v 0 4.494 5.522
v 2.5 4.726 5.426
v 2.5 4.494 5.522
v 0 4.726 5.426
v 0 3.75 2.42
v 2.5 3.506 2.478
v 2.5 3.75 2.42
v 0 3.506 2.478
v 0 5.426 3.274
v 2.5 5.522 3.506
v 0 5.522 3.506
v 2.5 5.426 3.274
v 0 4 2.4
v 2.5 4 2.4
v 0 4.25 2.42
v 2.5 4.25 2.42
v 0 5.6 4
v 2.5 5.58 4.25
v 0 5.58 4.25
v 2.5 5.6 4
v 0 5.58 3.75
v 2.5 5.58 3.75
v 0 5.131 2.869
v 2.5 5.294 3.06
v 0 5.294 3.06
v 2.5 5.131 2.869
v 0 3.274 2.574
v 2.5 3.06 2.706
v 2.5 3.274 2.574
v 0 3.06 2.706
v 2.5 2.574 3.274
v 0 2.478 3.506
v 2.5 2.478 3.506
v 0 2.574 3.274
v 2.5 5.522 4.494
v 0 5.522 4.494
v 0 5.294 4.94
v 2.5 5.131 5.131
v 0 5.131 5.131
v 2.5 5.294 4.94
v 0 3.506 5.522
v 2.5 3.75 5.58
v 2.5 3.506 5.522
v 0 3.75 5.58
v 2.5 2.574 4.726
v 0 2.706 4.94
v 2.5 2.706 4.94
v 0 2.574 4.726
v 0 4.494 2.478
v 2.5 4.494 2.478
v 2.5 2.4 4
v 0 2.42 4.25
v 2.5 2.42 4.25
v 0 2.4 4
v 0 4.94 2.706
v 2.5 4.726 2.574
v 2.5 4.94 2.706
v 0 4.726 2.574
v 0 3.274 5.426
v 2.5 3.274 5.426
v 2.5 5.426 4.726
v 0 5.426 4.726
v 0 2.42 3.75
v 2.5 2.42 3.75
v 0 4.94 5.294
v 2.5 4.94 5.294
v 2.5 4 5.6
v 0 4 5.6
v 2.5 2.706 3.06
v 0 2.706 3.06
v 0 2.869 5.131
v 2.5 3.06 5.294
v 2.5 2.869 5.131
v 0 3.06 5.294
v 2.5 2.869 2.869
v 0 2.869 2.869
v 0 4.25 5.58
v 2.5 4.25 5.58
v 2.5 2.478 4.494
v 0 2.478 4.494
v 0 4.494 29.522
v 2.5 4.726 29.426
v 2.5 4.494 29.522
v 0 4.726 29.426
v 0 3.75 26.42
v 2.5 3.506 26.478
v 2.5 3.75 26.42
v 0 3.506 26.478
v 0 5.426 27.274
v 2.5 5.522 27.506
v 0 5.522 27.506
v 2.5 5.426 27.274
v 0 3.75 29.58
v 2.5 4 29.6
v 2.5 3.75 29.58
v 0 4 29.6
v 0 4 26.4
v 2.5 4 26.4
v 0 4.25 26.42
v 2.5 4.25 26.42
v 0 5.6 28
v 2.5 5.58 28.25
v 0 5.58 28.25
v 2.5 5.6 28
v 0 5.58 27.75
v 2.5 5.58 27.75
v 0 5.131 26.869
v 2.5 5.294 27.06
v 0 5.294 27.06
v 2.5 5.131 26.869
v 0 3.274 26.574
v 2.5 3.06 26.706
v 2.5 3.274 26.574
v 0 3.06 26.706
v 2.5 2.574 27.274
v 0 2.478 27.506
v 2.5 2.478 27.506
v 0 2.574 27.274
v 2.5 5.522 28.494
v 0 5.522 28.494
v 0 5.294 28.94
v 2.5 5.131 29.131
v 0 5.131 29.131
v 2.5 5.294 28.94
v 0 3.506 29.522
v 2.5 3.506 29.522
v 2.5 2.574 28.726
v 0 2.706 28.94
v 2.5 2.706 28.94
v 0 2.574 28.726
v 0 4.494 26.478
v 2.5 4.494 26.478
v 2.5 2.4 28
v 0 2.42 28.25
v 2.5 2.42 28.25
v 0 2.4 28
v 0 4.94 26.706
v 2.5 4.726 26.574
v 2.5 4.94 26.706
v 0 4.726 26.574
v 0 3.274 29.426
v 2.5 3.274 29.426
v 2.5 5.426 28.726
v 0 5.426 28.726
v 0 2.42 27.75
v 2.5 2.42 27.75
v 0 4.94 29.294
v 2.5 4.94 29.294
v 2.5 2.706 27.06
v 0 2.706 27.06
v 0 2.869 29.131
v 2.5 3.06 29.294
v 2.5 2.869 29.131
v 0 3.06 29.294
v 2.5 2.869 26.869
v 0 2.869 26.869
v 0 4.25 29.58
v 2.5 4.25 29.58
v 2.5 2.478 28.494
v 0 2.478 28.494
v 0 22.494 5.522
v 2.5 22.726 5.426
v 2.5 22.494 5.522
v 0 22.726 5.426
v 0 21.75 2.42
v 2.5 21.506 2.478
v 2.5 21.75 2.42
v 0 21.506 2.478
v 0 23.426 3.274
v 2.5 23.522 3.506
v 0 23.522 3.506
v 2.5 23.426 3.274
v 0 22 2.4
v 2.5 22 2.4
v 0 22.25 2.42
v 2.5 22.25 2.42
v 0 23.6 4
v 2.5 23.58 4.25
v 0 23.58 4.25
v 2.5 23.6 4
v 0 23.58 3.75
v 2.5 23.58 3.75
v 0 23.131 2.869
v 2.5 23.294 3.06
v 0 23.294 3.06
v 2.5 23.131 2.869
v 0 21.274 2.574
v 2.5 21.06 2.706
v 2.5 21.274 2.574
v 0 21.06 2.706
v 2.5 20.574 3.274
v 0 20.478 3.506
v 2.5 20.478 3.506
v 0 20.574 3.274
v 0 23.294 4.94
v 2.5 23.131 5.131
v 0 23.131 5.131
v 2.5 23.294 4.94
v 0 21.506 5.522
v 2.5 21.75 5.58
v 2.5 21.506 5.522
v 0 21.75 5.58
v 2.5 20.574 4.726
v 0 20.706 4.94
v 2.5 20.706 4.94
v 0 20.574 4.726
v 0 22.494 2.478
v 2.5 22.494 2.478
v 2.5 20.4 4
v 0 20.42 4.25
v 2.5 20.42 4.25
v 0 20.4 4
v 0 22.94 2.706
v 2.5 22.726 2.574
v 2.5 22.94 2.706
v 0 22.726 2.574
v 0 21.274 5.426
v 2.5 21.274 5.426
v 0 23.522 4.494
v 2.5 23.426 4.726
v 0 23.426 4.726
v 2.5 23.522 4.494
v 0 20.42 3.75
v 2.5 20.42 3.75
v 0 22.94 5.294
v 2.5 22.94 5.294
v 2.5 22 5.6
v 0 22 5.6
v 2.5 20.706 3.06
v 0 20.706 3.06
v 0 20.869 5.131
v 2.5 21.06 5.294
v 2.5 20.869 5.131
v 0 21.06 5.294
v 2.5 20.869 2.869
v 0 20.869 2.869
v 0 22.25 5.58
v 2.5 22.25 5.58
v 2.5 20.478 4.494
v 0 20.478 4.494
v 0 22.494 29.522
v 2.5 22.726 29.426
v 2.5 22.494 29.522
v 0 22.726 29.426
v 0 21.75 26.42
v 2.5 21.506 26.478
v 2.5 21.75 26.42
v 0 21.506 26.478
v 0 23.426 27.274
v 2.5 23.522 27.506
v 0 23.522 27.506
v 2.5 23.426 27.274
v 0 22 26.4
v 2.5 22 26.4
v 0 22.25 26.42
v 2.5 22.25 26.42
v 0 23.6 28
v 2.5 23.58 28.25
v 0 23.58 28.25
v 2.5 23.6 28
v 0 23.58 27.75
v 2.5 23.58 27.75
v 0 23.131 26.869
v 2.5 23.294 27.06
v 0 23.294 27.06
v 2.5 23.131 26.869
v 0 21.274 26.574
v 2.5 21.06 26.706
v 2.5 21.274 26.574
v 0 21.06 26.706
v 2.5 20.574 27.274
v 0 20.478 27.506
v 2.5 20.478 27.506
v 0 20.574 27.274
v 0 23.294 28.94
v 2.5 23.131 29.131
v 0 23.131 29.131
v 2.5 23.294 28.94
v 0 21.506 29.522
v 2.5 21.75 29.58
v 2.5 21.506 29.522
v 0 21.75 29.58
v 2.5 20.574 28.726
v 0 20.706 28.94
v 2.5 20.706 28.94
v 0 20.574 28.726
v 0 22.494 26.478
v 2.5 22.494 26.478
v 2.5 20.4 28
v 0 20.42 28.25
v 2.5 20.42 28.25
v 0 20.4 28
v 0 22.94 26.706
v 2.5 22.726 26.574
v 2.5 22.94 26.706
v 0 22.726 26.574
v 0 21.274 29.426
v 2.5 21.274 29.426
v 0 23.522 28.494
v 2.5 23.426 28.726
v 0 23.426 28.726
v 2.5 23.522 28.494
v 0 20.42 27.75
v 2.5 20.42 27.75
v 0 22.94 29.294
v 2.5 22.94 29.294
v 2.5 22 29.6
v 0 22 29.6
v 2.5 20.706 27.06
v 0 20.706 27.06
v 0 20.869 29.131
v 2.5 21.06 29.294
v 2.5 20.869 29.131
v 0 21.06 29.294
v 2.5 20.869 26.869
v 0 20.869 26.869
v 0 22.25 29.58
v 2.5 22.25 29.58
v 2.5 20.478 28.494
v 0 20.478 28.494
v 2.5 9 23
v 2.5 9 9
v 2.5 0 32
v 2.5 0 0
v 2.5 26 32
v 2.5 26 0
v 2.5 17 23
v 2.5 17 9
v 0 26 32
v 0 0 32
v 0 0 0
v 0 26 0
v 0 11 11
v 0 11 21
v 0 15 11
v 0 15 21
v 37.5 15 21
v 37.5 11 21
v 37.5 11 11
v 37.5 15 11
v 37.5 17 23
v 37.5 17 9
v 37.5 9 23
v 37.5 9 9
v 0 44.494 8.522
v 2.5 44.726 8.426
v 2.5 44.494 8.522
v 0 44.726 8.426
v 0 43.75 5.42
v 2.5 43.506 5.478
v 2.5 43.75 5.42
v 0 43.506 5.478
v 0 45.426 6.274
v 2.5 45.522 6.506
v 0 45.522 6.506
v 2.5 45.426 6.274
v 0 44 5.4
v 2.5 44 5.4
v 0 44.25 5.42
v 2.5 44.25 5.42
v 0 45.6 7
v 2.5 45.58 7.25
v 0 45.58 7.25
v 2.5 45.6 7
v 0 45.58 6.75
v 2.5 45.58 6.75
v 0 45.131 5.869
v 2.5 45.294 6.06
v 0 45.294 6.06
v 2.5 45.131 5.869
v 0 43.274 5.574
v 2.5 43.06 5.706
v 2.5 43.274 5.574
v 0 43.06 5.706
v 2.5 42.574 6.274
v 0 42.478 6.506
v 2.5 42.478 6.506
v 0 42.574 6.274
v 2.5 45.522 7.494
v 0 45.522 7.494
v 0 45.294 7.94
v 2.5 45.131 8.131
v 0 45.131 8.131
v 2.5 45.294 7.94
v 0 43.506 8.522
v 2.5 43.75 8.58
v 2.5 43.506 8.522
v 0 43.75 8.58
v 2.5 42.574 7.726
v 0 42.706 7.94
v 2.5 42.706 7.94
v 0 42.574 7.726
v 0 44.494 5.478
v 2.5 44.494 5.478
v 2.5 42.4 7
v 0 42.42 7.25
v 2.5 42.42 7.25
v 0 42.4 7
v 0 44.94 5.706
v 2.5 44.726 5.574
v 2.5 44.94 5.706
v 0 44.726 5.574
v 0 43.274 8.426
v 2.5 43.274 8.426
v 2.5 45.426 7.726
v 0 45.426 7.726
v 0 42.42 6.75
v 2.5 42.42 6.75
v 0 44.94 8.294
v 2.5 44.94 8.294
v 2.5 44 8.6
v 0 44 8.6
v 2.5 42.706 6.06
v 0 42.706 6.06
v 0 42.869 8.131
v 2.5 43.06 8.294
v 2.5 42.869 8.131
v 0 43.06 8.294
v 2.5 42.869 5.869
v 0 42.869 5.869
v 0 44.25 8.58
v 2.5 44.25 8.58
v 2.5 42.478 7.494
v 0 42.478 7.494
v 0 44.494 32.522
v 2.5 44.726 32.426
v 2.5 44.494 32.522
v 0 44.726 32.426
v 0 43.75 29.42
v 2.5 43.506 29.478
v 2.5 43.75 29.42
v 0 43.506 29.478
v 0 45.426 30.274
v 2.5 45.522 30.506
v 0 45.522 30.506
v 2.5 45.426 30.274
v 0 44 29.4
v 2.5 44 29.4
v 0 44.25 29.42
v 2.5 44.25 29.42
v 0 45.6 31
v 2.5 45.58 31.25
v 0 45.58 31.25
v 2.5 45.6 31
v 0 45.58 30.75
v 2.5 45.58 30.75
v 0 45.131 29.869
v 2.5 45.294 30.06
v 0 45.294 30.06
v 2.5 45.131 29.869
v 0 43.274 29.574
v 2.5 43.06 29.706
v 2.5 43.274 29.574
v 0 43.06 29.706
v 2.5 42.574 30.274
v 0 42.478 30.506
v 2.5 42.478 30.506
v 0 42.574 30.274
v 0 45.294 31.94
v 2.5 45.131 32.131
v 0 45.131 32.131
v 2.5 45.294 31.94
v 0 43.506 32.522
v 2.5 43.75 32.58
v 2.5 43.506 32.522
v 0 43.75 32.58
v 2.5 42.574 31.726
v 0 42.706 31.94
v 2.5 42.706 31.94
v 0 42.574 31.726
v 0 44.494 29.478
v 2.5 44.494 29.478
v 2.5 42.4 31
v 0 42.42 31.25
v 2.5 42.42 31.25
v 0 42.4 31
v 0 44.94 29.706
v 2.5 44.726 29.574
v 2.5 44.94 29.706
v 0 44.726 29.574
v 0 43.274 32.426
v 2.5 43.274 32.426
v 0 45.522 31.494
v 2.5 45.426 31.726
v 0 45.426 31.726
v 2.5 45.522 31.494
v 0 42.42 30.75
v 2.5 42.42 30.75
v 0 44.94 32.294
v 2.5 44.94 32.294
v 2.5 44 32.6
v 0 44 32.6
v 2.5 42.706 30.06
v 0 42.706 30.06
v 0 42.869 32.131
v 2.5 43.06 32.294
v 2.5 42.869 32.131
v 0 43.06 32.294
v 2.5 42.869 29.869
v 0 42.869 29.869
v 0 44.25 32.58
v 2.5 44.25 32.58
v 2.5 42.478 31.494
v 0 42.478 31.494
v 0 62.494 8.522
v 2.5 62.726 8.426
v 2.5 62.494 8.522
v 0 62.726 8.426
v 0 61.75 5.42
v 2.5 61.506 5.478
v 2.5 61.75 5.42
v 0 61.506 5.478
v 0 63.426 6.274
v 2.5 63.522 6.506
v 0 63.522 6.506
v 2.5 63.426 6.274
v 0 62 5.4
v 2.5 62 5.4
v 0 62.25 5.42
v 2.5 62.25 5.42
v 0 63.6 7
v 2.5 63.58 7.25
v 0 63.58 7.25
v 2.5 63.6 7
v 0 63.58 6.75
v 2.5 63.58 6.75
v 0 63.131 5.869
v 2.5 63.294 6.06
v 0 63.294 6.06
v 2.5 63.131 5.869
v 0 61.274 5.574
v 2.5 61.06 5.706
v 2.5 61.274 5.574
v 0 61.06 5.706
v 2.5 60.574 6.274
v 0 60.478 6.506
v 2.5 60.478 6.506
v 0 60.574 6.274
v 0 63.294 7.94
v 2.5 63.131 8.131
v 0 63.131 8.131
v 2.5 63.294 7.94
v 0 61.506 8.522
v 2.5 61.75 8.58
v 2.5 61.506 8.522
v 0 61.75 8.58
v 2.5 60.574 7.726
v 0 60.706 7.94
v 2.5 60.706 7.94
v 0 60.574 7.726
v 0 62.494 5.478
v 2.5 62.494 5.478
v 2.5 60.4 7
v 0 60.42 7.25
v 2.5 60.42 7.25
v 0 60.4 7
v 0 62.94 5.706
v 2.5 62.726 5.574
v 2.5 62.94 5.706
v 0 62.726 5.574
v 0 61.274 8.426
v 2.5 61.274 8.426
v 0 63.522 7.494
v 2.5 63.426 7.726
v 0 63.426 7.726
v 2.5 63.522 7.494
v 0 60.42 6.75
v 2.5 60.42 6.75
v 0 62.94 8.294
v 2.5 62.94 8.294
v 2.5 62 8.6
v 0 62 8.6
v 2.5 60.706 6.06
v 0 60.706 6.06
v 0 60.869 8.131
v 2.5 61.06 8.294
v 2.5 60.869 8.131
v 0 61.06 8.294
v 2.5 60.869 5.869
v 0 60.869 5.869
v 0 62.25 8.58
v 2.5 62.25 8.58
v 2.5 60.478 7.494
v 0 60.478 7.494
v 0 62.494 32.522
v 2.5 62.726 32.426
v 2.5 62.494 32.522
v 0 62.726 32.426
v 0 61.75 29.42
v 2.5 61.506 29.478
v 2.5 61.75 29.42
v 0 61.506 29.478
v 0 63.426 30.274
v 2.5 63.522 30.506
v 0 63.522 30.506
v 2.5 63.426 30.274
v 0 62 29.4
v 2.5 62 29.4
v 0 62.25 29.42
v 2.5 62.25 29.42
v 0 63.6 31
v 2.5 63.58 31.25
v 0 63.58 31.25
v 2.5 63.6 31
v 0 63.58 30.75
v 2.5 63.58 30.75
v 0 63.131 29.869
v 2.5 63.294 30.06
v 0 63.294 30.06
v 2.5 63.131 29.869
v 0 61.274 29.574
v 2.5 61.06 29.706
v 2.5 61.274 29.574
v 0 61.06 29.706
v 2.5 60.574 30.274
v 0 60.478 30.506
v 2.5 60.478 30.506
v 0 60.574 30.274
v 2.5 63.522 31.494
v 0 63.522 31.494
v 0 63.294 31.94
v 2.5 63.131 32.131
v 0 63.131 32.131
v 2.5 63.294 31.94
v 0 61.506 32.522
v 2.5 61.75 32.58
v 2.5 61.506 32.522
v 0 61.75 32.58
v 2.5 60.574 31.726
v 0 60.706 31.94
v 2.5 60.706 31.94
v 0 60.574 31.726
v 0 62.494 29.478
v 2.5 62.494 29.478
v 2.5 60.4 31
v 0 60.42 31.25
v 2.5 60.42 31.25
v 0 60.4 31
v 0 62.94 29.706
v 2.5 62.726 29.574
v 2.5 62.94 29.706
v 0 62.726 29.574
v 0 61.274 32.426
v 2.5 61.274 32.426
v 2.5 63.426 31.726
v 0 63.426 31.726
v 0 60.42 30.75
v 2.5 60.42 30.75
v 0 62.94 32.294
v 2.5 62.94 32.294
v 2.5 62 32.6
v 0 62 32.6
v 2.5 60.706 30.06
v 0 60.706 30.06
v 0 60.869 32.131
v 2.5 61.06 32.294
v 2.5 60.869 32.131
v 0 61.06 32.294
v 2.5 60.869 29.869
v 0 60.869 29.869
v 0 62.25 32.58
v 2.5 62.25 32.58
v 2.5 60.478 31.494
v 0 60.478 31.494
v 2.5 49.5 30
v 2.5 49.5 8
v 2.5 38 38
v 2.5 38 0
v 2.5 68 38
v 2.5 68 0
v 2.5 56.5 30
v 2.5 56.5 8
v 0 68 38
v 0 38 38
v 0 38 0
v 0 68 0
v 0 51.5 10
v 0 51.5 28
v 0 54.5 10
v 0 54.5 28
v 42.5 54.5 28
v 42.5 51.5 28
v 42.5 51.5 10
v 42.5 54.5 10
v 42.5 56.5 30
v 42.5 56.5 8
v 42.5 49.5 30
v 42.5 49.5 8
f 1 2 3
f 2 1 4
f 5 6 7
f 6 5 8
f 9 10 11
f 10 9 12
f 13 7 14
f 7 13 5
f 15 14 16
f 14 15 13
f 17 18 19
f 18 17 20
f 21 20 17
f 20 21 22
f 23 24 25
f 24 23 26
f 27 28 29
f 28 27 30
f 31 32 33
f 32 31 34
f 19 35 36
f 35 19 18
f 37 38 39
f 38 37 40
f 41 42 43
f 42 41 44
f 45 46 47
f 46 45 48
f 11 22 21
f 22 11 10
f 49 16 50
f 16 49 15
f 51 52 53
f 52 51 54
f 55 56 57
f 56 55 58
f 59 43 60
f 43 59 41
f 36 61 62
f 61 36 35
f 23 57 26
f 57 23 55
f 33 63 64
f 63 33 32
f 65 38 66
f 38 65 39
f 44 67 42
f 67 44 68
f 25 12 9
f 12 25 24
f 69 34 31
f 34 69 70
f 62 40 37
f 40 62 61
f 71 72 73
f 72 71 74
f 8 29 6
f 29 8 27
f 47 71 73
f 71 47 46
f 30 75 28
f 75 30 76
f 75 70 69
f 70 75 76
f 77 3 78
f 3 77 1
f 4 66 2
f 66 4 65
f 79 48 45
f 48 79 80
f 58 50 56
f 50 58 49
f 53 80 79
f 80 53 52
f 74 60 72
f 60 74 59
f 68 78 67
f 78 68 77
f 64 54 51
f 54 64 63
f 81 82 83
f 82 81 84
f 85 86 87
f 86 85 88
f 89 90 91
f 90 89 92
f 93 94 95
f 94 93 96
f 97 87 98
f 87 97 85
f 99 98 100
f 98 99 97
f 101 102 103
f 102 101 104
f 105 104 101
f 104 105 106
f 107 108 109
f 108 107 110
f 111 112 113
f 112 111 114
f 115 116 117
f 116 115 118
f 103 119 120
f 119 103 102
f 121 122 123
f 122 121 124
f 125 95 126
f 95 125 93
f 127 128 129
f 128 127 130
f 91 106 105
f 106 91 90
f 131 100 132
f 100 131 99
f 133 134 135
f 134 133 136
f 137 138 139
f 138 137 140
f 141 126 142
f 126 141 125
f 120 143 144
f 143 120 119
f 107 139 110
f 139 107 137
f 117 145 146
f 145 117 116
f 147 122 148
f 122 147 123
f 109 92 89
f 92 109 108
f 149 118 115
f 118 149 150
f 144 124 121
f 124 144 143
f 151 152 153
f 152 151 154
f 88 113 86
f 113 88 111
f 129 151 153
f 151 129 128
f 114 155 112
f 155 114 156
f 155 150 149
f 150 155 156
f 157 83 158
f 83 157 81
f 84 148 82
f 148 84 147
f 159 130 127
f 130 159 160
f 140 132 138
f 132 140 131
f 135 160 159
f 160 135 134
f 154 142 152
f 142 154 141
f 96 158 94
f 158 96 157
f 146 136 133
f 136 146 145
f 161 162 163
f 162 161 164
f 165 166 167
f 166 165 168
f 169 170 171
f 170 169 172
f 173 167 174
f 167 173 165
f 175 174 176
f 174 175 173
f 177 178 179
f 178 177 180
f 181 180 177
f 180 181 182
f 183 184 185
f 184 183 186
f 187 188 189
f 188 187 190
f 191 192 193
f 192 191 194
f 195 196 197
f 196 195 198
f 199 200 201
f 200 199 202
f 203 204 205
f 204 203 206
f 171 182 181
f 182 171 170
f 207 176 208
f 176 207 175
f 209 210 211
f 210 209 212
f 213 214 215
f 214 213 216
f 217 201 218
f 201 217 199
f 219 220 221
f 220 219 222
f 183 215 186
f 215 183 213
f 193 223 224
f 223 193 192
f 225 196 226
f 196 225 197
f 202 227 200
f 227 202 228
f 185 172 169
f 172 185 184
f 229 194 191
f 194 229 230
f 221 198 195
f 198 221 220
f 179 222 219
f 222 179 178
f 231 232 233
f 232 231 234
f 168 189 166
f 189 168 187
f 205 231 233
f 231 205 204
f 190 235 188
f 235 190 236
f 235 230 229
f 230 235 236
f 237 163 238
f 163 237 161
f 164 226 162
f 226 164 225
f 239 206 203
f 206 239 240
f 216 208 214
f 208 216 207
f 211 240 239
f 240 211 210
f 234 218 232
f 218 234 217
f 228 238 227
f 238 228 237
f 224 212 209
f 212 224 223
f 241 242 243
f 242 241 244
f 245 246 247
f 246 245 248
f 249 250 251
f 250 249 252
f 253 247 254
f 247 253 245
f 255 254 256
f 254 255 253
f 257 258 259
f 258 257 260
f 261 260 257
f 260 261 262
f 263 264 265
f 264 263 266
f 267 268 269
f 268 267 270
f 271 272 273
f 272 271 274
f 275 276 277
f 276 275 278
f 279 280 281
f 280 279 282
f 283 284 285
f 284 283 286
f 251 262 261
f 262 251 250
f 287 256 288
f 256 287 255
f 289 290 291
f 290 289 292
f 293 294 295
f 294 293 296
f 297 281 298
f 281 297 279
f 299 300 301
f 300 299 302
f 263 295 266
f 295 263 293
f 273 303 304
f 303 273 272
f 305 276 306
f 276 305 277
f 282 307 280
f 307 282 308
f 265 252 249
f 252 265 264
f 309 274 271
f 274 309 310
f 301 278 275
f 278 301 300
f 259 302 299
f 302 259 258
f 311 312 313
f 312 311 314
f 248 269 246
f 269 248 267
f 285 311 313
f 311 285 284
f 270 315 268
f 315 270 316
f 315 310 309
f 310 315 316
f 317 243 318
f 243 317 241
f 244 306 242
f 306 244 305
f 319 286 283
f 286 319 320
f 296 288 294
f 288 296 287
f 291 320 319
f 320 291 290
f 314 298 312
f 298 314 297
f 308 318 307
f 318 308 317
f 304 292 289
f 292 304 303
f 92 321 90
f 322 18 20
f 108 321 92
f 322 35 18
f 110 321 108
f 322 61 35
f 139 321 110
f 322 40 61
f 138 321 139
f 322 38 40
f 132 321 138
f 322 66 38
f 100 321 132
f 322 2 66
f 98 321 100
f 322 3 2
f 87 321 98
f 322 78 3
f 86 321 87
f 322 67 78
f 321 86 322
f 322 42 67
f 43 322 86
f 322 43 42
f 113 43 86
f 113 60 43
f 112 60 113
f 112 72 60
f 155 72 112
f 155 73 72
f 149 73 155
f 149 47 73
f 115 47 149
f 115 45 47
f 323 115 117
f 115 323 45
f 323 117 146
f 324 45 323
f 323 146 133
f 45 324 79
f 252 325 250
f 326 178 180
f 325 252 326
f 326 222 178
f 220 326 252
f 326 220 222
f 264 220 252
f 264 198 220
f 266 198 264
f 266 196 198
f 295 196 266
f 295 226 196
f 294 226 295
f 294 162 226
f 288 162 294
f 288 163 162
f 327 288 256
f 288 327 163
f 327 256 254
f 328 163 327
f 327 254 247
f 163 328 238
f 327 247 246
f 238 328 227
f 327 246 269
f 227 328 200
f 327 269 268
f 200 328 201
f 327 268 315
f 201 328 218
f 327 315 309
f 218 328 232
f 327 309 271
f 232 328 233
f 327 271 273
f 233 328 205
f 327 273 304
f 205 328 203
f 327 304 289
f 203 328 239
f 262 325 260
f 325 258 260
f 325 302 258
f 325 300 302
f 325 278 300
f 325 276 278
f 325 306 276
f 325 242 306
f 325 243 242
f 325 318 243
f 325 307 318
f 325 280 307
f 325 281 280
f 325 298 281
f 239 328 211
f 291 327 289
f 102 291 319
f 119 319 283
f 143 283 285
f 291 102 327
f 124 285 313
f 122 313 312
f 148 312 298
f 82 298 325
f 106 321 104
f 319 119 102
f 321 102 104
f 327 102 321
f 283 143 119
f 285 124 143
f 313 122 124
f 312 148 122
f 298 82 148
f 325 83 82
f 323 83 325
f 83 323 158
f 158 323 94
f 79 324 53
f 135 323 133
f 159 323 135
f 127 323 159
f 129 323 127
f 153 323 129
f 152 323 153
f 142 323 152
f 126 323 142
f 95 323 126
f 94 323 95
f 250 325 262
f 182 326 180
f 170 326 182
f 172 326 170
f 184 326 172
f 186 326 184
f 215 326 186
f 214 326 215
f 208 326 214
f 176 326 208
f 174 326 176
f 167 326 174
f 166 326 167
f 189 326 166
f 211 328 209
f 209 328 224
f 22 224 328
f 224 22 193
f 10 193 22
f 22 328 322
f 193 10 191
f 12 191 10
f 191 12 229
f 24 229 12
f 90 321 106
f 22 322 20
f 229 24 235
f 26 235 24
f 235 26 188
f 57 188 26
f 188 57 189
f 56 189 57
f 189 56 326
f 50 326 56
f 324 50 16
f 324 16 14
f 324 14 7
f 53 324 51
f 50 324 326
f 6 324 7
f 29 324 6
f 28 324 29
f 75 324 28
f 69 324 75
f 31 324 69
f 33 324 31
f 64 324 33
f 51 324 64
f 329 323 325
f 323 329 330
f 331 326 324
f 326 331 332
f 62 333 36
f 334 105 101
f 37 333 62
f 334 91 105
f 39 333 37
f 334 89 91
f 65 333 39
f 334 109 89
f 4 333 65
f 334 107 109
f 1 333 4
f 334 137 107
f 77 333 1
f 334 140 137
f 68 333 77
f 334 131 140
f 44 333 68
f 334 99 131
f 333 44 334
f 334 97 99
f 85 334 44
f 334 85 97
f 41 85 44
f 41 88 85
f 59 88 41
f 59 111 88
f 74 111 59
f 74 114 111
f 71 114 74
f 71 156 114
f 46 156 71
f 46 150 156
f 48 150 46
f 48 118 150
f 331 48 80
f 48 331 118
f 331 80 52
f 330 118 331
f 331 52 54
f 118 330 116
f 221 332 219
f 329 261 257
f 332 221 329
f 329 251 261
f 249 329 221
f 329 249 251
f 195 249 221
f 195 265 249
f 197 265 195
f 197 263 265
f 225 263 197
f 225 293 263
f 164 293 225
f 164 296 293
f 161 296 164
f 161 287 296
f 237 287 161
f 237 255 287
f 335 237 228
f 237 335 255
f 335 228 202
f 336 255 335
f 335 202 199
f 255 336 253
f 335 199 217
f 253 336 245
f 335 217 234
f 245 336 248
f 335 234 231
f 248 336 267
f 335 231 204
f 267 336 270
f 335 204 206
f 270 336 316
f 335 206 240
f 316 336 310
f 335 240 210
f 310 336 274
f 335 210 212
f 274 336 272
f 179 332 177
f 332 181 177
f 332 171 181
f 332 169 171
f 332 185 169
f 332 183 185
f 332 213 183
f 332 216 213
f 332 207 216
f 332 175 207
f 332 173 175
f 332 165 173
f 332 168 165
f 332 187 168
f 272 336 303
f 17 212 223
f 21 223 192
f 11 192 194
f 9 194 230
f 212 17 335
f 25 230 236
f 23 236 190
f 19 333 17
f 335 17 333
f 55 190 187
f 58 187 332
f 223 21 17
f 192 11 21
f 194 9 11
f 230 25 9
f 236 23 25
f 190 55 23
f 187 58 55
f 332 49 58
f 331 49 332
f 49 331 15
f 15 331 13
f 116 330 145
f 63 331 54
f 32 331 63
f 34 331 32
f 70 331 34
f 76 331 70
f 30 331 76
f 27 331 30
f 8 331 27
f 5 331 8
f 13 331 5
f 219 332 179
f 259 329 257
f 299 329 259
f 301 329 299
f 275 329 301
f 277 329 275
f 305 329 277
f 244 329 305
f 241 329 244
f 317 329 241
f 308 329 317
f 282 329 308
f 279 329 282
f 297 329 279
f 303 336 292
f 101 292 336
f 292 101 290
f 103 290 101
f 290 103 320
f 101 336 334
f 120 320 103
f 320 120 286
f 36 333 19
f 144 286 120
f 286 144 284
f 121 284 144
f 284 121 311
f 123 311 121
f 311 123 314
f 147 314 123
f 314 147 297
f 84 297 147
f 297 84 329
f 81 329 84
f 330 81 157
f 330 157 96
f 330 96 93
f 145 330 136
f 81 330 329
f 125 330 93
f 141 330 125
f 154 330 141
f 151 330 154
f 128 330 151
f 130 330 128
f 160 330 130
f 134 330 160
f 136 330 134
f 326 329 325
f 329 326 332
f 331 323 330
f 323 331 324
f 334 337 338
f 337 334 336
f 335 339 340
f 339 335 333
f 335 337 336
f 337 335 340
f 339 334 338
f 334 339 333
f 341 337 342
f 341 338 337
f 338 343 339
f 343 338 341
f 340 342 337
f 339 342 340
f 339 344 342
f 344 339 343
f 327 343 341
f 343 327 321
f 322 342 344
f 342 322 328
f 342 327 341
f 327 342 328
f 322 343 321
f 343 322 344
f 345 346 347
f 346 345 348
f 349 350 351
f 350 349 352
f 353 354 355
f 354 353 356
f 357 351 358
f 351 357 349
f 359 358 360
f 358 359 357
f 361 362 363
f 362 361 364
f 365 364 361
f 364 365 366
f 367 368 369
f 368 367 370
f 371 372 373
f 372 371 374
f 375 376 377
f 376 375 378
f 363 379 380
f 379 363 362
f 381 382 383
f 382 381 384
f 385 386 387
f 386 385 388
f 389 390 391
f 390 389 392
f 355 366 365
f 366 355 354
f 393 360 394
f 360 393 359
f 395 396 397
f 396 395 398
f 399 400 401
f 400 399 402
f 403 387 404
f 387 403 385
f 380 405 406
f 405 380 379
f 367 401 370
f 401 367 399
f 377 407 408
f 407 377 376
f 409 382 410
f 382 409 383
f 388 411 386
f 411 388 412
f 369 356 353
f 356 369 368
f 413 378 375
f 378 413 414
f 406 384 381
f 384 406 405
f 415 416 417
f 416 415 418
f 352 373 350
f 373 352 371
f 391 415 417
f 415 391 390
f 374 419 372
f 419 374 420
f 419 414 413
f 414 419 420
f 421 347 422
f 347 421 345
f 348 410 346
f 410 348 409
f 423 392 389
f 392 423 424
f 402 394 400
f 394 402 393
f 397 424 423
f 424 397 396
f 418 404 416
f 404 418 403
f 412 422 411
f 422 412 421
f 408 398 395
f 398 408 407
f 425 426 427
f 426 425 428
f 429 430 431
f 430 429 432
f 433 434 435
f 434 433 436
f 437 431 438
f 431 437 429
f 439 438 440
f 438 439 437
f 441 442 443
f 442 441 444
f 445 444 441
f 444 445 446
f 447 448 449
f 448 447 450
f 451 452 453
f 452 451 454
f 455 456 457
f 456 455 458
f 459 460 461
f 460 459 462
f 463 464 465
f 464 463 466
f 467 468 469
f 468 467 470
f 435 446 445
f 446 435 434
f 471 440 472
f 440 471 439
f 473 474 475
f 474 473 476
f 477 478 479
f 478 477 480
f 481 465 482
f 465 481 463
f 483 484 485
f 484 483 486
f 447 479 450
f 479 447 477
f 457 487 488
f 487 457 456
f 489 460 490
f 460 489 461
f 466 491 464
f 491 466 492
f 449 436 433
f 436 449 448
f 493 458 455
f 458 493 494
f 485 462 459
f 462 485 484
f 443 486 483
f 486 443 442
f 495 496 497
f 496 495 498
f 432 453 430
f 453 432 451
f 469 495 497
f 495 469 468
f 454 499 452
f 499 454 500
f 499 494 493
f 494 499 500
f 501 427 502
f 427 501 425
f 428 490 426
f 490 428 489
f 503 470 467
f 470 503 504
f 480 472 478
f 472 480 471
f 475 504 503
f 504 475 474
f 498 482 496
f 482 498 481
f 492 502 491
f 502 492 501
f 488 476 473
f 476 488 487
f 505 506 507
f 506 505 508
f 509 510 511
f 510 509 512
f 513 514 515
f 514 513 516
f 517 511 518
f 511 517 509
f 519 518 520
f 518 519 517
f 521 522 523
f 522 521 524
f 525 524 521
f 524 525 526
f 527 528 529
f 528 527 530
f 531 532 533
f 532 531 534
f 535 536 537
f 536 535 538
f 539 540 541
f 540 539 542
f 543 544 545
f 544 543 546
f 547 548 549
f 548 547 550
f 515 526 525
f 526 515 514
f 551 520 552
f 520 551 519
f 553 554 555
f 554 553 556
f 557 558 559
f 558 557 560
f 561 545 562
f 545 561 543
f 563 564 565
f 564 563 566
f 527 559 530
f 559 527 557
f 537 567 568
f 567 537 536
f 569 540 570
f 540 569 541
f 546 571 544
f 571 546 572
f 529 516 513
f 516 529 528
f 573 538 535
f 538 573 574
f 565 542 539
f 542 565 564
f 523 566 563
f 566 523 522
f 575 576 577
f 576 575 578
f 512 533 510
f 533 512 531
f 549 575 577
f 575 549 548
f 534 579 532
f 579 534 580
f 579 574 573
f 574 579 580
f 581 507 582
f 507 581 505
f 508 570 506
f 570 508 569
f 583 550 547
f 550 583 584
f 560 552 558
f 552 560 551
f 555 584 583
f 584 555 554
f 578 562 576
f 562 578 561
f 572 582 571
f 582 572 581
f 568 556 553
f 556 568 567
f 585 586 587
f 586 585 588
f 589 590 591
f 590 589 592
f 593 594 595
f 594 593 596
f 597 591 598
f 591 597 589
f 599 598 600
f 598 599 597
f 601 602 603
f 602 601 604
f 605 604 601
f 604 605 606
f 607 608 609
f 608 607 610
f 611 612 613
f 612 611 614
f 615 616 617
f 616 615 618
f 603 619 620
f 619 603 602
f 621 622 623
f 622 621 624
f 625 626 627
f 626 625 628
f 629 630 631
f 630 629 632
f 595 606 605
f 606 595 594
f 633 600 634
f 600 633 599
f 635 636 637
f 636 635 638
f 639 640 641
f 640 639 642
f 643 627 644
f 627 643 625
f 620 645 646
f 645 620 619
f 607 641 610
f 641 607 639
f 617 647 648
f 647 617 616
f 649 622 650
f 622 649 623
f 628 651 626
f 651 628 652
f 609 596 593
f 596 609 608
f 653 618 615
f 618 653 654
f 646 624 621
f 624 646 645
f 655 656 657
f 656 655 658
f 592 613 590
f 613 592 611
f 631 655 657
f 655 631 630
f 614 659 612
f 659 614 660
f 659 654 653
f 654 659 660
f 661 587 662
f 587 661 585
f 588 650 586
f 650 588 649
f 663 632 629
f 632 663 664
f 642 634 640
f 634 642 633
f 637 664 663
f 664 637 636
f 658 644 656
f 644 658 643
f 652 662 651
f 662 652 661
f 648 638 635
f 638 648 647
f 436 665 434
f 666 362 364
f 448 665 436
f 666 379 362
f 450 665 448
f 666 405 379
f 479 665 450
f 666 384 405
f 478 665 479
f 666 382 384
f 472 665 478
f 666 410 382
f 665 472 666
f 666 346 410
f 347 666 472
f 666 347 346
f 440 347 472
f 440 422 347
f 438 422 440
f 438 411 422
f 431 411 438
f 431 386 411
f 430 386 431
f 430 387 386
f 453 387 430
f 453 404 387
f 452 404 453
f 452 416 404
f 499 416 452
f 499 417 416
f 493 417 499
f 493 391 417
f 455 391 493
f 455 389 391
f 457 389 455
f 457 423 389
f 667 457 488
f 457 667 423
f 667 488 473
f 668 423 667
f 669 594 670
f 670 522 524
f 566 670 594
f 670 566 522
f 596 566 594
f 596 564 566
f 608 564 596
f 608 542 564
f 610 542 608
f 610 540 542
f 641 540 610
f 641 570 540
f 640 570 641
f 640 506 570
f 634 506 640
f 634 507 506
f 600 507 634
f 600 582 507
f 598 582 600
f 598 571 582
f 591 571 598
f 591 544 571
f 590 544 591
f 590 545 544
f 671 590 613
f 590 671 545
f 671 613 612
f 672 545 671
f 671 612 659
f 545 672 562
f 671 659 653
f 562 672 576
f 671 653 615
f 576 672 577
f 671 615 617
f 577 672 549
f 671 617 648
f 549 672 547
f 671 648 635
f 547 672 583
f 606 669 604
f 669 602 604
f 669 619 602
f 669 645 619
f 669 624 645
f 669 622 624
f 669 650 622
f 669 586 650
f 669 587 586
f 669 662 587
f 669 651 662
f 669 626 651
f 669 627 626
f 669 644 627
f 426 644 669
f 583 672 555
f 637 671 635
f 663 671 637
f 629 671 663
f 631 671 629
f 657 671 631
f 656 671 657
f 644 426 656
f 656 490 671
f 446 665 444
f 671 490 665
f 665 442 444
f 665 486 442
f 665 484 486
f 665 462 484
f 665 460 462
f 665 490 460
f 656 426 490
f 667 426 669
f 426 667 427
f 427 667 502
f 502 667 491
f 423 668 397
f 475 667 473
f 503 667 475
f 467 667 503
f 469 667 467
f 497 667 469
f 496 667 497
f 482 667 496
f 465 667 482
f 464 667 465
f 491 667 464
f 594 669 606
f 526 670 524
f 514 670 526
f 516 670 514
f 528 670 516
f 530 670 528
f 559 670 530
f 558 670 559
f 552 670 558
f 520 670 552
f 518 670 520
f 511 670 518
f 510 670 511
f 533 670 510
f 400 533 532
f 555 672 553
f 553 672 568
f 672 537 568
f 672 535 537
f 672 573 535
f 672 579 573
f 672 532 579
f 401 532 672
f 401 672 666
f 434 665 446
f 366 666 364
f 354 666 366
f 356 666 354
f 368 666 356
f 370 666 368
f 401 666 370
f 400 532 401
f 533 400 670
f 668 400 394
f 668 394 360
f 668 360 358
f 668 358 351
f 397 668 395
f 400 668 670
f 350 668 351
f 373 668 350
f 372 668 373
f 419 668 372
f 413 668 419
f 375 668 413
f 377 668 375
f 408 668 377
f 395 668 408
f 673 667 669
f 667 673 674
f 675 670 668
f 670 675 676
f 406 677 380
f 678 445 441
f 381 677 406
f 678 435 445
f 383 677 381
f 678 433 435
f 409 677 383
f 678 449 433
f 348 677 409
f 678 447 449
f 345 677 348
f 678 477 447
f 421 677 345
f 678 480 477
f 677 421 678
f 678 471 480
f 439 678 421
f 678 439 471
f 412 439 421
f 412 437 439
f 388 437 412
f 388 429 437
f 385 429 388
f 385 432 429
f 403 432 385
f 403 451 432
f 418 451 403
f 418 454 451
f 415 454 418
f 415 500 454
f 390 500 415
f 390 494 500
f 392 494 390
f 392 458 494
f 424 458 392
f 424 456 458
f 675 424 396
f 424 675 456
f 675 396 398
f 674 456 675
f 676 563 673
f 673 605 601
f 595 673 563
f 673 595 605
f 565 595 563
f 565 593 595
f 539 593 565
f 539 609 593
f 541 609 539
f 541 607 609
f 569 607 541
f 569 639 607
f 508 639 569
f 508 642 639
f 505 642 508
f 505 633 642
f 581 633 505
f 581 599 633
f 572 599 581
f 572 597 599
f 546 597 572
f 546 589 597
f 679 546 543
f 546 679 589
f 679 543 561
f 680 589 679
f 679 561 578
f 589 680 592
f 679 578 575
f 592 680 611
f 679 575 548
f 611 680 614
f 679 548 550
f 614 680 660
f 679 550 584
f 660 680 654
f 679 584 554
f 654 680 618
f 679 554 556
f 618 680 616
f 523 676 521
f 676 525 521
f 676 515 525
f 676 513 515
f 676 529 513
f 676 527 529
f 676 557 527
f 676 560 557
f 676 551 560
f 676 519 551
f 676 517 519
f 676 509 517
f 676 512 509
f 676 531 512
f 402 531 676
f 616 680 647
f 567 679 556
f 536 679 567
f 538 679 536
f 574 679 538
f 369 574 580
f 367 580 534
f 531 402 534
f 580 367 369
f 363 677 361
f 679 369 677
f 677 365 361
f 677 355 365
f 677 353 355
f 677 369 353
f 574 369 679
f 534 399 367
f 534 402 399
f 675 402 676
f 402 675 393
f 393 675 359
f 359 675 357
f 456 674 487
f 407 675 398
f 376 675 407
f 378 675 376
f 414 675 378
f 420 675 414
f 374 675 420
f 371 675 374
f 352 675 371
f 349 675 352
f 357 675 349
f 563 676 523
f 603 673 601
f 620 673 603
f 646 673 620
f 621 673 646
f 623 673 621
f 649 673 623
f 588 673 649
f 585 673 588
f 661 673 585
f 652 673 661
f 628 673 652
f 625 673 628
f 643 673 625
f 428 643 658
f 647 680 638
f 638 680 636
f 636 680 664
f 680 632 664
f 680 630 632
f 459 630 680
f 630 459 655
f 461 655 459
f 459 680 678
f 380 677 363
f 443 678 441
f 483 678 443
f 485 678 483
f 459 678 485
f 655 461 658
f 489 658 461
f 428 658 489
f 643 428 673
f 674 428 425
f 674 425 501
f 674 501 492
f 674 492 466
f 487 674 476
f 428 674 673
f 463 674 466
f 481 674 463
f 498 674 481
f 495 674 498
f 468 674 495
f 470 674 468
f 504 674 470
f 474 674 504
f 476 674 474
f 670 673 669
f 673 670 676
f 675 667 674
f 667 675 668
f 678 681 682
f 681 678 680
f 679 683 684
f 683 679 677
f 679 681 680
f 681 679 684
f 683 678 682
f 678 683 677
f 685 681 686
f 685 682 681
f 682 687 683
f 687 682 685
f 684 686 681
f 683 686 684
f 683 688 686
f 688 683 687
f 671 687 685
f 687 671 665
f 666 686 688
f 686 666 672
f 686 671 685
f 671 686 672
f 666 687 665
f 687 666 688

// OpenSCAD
// PiLapTimer optical baffle prototypes.
// Check every mounting dimension against the actual enclosure before printing.
part = "both"; // "receiver", "beacon", or "both"

wall = 2.0;
flange_thickness = 2.5;
screw_diameter = 3.2;
screw_spacing_y = 18;
screw_spacing_z = 24;

receiver_depth = 35;
receiver_opening_y = 4;
receiver_opening_z = 10;

beacon_depth = 40;
beacon_opening_y = 3;
beacon_opening_z = 18;

$fn = 40;
epsilon = 0.1;

module flange(opening_y, opening_z, outer_y, outer_z) {
  difference() {
    cube([flange_thickness, outer_y, outer_z], center = false);
    translate([-epsilon, (outer_y-opening_y)/2, (outer_z-opening_z)/2])
      cube([flange_thickness + 2*epsilon, opening_y, opening_z], center = false);
    for (y = [-1, 1], z = [-1, 1])
      translate([-epsilon,
                 outer_y/2 + y*screw_spacing_y/2,
                 outer_z/2 + z*screw_spacing_z/2])
        rotate([0, 90, 0])
          cylinder(h = flange_thickness + 2*epsilon, d = screw_diameter);
  }
}

module rectangular_tunnel(depth, opening_y, opening_z) {
  outer_y = opening_y + 2*wall;
  outer_z = opening_z + 2*wall;
  difference() {
    cube([depth, outer_y, outer_z], center = false);
    translate([-epsilon, wall, wall])
      cube([depth + 2*epsilon, opening_y, opening_z], center = false);
  }
}

module baffle(depth, opening_y, opening_z, flange_y, flange_z) {
  flange(opening_y, opening_z, flange_y, flange_z);
  translate([flange_thickness,
             (flange_y - opening_y - 2*wall)/2,
             (flange_z - opening_z - 2*wall)/2])
    rectangular_tunnel(depth, opening_y, opening_z);
}

module receiver_baffle() {
  baffle(receiver_depth, receiver_opening_y, receiver_opening_z, 26, 32);
}

module beacon_baffle() {
  baffle(beacon_depth, beacon_opening_y, beacon_opening_z, 30, 38);
}

if (part == "receiver") {
  receiver_baffle();
} else if (part == "beacon") {
  beacon_baffle();
} else {
  receiver_baffle();
  translate([0, 38, 0]) beacon_baffle();
}
